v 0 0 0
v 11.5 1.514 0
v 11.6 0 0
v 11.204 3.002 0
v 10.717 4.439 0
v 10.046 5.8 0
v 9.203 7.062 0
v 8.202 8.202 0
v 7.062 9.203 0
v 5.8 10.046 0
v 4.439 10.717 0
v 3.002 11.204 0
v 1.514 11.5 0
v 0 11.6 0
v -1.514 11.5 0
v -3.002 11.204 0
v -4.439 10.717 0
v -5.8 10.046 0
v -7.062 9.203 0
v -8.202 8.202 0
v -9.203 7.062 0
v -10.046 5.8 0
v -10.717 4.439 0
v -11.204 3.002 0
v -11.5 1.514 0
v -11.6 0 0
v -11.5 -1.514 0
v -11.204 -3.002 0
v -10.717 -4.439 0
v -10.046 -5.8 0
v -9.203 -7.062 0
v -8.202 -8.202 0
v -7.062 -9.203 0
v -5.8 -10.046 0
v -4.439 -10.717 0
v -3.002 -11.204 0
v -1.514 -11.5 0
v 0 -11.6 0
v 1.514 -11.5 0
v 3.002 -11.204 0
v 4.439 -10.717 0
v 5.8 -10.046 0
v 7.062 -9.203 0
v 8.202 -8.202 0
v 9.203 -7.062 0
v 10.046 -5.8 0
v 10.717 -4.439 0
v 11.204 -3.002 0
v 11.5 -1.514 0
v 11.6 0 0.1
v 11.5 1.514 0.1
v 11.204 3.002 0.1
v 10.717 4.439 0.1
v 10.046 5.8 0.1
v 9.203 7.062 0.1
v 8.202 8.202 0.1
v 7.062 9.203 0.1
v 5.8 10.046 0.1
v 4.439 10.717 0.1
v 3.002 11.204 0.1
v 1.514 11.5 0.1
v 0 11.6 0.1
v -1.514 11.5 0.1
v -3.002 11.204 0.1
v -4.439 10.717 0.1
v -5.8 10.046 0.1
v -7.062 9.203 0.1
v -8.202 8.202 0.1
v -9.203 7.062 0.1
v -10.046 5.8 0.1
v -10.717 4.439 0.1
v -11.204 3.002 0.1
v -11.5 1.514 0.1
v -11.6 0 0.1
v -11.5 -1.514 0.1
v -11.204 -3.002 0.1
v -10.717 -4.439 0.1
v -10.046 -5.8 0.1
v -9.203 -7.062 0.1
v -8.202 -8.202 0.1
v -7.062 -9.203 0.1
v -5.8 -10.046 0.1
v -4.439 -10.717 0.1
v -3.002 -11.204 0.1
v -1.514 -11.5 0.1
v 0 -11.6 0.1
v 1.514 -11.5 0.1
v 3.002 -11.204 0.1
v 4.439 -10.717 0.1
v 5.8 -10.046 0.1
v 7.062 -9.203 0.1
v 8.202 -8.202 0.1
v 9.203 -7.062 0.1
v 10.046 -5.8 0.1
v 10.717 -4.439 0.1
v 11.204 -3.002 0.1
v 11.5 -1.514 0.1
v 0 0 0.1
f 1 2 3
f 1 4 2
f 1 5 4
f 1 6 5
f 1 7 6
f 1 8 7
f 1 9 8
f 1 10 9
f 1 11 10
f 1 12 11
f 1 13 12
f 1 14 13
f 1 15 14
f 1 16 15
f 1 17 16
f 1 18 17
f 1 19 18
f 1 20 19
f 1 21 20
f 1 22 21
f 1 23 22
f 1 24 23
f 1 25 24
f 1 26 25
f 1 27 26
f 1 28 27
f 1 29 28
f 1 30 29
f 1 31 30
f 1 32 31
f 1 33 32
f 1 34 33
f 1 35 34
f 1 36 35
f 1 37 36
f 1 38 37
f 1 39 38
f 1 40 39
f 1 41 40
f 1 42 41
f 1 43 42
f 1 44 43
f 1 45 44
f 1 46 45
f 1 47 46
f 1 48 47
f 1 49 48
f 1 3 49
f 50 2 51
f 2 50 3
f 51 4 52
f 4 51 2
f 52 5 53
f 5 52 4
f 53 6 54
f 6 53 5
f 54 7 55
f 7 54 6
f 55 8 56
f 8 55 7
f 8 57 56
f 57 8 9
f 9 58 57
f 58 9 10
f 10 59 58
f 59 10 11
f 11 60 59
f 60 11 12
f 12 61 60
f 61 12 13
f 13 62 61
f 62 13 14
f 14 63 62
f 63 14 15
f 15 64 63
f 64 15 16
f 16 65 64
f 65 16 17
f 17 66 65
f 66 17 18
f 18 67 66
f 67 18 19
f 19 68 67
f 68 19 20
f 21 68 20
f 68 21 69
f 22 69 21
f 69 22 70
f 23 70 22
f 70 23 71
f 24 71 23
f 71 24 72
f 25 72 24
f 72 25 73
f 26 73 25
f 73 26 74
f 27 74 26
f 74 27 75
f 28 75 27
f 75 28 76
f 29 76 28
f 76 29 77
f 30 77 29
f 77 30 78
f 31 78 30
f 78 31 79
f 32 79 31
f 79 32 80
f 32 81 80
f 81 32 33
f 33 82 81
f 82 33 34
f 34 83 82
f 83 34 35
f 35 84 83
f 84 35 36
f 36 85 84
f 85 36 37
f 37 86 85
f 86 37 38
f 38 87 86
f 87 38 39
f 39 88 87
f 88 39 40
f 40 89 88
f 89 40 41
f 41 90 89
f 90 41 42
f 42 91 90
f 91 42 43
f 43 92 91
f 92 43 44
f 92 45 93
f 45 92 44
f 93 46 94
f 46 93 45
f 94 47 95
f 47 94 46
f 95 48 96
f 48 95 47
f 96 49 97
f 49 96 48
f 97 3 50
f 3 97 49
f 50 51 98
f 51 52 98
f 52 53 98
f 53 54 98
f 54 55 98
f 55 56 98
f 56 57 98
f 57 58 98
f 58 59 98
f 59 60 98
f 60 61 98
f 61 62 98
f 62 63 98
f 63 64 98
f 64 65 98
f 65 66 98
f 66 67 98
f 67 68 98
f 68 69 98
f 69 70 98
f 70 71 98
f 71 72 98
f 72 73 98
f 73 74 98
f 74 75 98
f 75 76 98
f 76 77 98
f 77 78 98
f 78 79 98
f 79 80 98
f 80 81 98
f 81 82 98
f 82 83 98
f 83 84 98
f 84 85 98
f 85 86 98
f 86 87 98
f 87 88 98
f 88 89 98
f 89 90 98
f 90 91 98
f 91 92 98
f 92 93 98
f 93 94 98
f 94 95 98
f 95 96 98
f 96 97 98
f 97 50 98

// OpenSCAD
// file: ../p/48/1-4cyli.scad
use <../../lib.scad>
function ldraw_lib__48__1_4cyli() = [
// 0 Hi-Res Cylinder 0.25
// 0 Name: 48\1-4cyli.dat
// 0 Author: Manfred Moolhuysen
// 0 !LDRAW_ORG 48_Primitive UPDATE 2009-01
// 0 !LICENSE Licensed under CC BY 2.0 and CC BY 4.0 : see CAreadme.txt
// 
// 0 BFC CERTIFY CCW
  [0,"BFC","CERTIFY"],
  [0,"BFC","CCW"],
// 
// 0 !HISTORY 1999-07-05 [PTadmin] Official Update 1999-05
// 0 !HISTORY 2002-02-28 [hafhead] Added BFC statement
// 0 !HISTORY 2002-04-25 [PTadmin] Official Update 2002-02
// 0 !HISTORY 2007-06-24 [PTadmin] Header formatted for Contributor Agreement
// 0 !HISTORY 2008-07-01 [PTadmin] Official Update 2008-01
// 0 !HISTORY 2008-07-07 [guyvivan] Made BFC'ed CCW (2005-12-06)
// 0 !HISTORY 2009-05-02 [PTadmin] Official Update 2009-01
// 
// 
// 4 16 0.9914 0 0.1305 1 0 0 1 1 0 0.9914 1 0.1305
  [4,16,0.9914,0,0.1305,1,0,0,1,1,0,0.9914,1,0.1305],
// 4 16 0.9659 0 0.2588 0.9914 0 0.1305 0.9914 1 0.1305 0.9659 1 0.2588
  [4,16,0.9659,0,0.2588,0.9914,0,0.1305,0.9914,1,0.1305,0.9659,1,0.2588],
// 4 16 0.9239 0 0.3827 0.9659 0 0.2588 0.9659 1 0.2588 0.9239 1 0.3827
  [4,16,0.9239,0,0.3827,0.9659,0,0.2588,0.9659,1,0.2588,0.9239,1,0.3827],
// 4 16 0.866 0 0.5 0.9239 0 0.3827 0.9239 1 0.3827 0.866 1 0.5
  [4,16,0.866,0,0.5,0.9239,0,0.3827,0.9239,1,0.3827,0.866,1,0.5],
// 4 16 0.7934 0 0.6088 0.866 0 0.5 0.866 1 0.5 0.7934 1 0.6088
  [4,16,0.7934,0,0.6088,0.866,0,0.5,0.866,1,0.5,0.7934,1,0.6088],
// 4 16 0.7071 0 0.7071 0.7934 0 0.6088 0.7934 1 0.6088 0.7071 1 0.7071
  [4,16,0.7071,0,0.7071,0.7934,0,0.6088,0.7934,1,0.6088,0.7071,1,0.7071],
// 4 16 0.6088 0 0.7934 0.7071 0 0.7071 0.7071 1 0.7071 0.6088 1 0.7934
  [4,16,0.6088,0,0.7934,0.7071,0,0.7071,0.7071,1,0.7071,0.6088,1,0.7934],
// 4 16 0.5 0 0.866 0.6088 0 0.7934 0.6088 1 0.7934 0.5 1 0.866
  [4,16,0.5,0,0.866,0.6088,0,0.7934,0.6088,1,0.7934,0.5,1,0.866],
// 4 16 0.3827 0 0.9239 0.5 0 0.866 0.5 1 0.866 0.3827 1 0.9239
  [4,16,0.3827,0,0.9239,0.5,0,0.866,0.5,1,0.866,0.3827,1,0.9239],
// 4 16 0.2588 0 0.9659 0.3827 0 0.9239 0.3827 1 0.9239 0.2588 1 0.9659
  [4,16,0.2588,0,0.9659,0.3827,0,0.9239,0.3827,1,0.9239,0.2588,1,0.9659],
// 4 16 0.1305 0 0.9914 0.2588 0 0.9659 0.2588 1 0.9659 0.1305 1 0.9914
  [4,16,0.1305,0,0.9914,0.2588,0,0.9659,0.2588,1,0.9659,0.1305,1,0.9914],
// 4 16 0 0 1 0.1305 0 0.9914 0.1305 1 0.9914 0 1 1
  [4,16,0,0,1,0.1305,0,0.9914,0.1305,1,0.9914,0,1,1],
// 
// 0 conditional lines
// 5 24 1 1 0 1 0 0 1 1 -1 0.9914 1 0.1305
  [5,24,1,1,0,1,0,0,1,1,-1,0.9914,1,0.1305],
// 5 24 0.9914 1 0.1305 0.9914 0 0.1305 1 1 0 0.9659 1 0.2588
  [5,24,0.9914,1,0.1305,0.9914,0,0.1305,1,1,0,0.9659,1,0.2588],
// 5 24 0.9659 1 0.2588 0.9659 0 0.2588 0.9914 1 0.1305 0.9239 1 0.3827
  [5,24,0.9659,1,0.2588,0.9659,0,0.2588,0.9914,1,0.1305,0.9239,1,0.3827],
// 5 24 0.9239 1 0.3827 0.9239 0 0.3827 0.9659 1 0.2588 0.866 1 0.5
  [5,24,0.9239,1,0.3827,0.9239,0,0.3827,0.9659,1,0.2588,0.866,1,0.5],
// 5 24 0.866 1 0.5 0.866 0 0.5 0.9239 1 0.3827 0.7934 1 0.6088
  [5,24,0.866,1,0.5,0.866,0,0.5,0.9239,1,0.3827,0.7934,1,0.6088],
// 5 24 0.7934 1 0.6088 0.7934 0 0.6088 0.866 1 0.5 0.7071 1 0.7071
  [5,24,0.7934,1,0.6088,0.7934,0,0.6088,0.866,1,0.5,0.7071,1,0.7071],
// 5 24 0.7071 1 0.7071 0.7071 0 0.7071 0.7934 1 0.6088 0.6088 1 0.7934
  [5,24,0.7071,1,0.7071,0.7071,0,0.7071,0.7934,1,0.6088,0.6088,1,0.7934],
// 5 24 0.6088 1 0.7934 0.6088 0 0.7934 0.7071 1 0.7071 0.5 1 0.866
  [5,24,0.6088,1,0.7934,0.6088,0,0.7934,0.7071,1,0.7071,0.5,1,0.866],
// 5 24 0.5 1 0.866 0.5 0 0.866 0.6088 1 0.7934 0.3827 1 0.9239
  [5,24,0.5,1,0.866,0.5,0,0.866,0.6088,1,0.7934,0.3827,1,0.9239],
// 5 24 0.3827 1 0.9239 0.3827 0 0.9239 0.5 1 0.866 0.2588 1 0.9659
  [5,24,0.3827,1,0.9239,0.3827,0,0.9239,0.5,1,0.866,0.2588,1,0.9659],
// 5 24 0.2588 1 0.9659 0.2588 0 0.9659 0.3827 1 0.9239 0.1305 1 0.9914
  [5,24,0.2588,1,0.9659,0.2588,0,0.9659,0.3827,1,0.9239,0.1305,1,0.9914],
// 5 24 0.1305 1 0.9914 0.1305 0 0.9914 0.2588 1 0.9659 0 1 1
  [5,24,0.1305,1,0.9914,0.1305,0,0.9914,0.2588,1,0.9659,0,1,1],
// 5 24 0 1 1 0 0 1 0.1305 1 0.9914 -1 1 1
  [5,24,0,1,1,0,0,1,0.1305,1,0.9914,-1,1,1],
// 
// 0 end of file
];
module ldraw_lib__48__1_4cyli(step=0, col=false, unit=2/5, alt=false, line=0.2, solid=!$preview)
    makepoly(ldraw_lib__48__1_4cyli(), step=step, col=col, unit=unit, alt=alt, line=line, solid=solid);
ldraw_lib__48__1_4cyli(line=0.2);
// file: ../p/48/4-4cyli.scad
use <../../lib.scad>
use <1-4cyli.scad>
function ldraw_lib__48__4_4cyli() = [
// 0 Hi-Res Cylinder 1.0
// 0 Name: 48\4-4cyli.dat
// 0 Author: Paul Easter [pneaster]
// 0 !LDRAW_ORG 48_Primitive UPDATE 2012-02
// 0 !LICENSE Licensed under CC BY 4.0 : see CAreadme.txt
// 
// 0 BFC CERTIFY CCW
  [0,"BFC","CERTIFY"],
  [0,"BFC","CCW"],
// 
// 0 !HISTORY 2002-08-18 [PTadmin] Official Update 2002-04
// 0 !HISTORY 2007-06-24 [PTadmin] Header formatted for Contributor Agreement
// 0 !HISTORY 2008-07-01 [PTadmin] Official Update 2008-01
// 0 !HISTORY 2012-02-27 [Philo] Changed to CCW
// 0 !HISTORY 2012-08-09 [PTadmin] Official Update 2012-02
// 
// 
// 1 16 0 0 0 1 0 0 0 1 0 0 0 1 48\1-4cyli.dat
  [1,16,0,0,0,1,0,0,0,1,0,0,0,1, ldraw_lib__48__1_4cyli()],
// 1 16 0 0 0 0 0 -1 0 1 0 1 0 0 48\1-4cyli.dat
  [1,16,0,0,0,0,0,-1,0,1,0,1,0,0, ldraw_lib__48__1_4cyli()],
// 1 16 0 0 0 -1 0 0 0 1 0 0 0 -1 48\1-4cyli.dat
  [1,16,0,0,0,-1,0,0,0,1,0,0,0,-1, ldraw_lib__48__1_4cyli()],
// 1 16 0 0 0 0 0 1 0 1 0 -1 0 0 48\1-4cyli.dat
  [1,16,0,0,0,0,0,1,0,1,0,-1,0,0, ldraw_lib__48__1_4cyli()],
];
module ldraw_lib__48__4_4cyli(step=0, col=false, unit=2/5, alt=false, line=0.2, solid=!$preview)
    makepoly(ldraw_lib__48__4_4cyli(), step=step, col=col, unit=unit, alt=alt, line=line, solid=solid);
ldraw_lib__48__4_4cyli(line=0.2);
// file: ../p/48/4-4disc.scad
use <../../lib.scad>
function ldraw_lib__48__4_4disc() = [
// 0 Hi-Res Disc 1.0
// 0 Name: 48\4-4disc.dat
// 0 Author: Miklos Hosszu [hmick]
// 0 !LDRAW_ORG 48_Primitive UPDATE 2012-02
// 0 !LICENSE Licensed under CC BY 2.0 and CC BY 4.0 : see CAreadme.txt
// 
// 0 BFC CERTIFY CCW
  [0,"BFC","CERTIFY"],
  [0,"BFC","CCW"],
// 
// 0 !HISTORY 2004-11-06 [PTadmin] Official Update 2004-04
// 0 !HISTORY 2007-06-24 [PTadmin] Header formatted for Contributor Agreement
// 0 !HISTORY 2008-07-01 [PTadmin] Official Update 2008-01
// 0 !HISTORY 2012-02-27 [Philo] Changed to CCW
// 0 !HISTORY 2012-08-09 [PTadmin] Official Update 2012-02
// 
// 
// 3 16 1 0 0 0.9914 0 0.1305 0 0 0
  [3,16,1,0,0,0.9914,0,0.1305,0,0,0],
// 3 16 0.9914 0 0.1305 0.9659 0 0.2588 0 0 0
  [3,16,0.9914,0,0.1305,0.9659,0,0.2588,0,0,0],
// 3 16 0.9659 0 0.2588 0.9239 0 0.3827 0 0 0
  [3,16,0.9659,0,0.2588,0.9239,0,0.3827,0,0,0],
// 3 16 0.9239 0 0.3827 0.866 0 0.5 0 0 0
  [3,16,0.9239,0,0.3827,0.866,0,0.5,0,0,0],
// 3 16 0.866 0 0.5 0.7934 0 0.6088 0 0 0
  [3,16,0.866,0,0.5,0.7934,0,0.6088,0,0,0],
// 3 16 0.7934 0 0.6088 0.7071 0 0.7071 0 0 0
  [3,16,0.7934,0,0.6088,0.7071,0,0.7071,0,0,0],
// 3 16 0.7071 0 0.7071 0.6088 0 0.7934 0 0 0
  [3,16,0.7071,0,0.7071,0.6088,0,0.7934,0,0,0],
// 3 16 0.6088 0 0.7934 0.5 0 0.866 0 0 0
  [3,16,0.6088,0,0.7934,0.5,0,0.866,0,0,0],
// 3 16 0.5 0 0.866 0.3827 0 0.9239 0 0 0
  [3,16,0.5,0,0.866,0.3827,0,0.9239,0,0,0],
// 3 16 0.3827 0 0.9239 0.2588 0 0.9659 0 0 0
  [3,16,0.3827,0,0.9239,0.2588,0,0.9659,0,0,0],
// 3 16 0.2588 0 0.9659 0.1305 0 0.9914 0 0 0
  [3,16,0.2588,0,0.9659,0.1305,0,0.9914,0,0,0],
// 3 16 0.1305 0 0.9914 0 0 1 0 0 0
  [3,16,0.1305,0,0.9914,0,0,1,0,0,0],
// 3 16 0 0 1 -0.1305 0 0.9914 0 0 0
  [3,16,0,0,1,-0.1305,0,0.9914,0,0,0],
// 3 16 -0.1305 0 0.9914 -0.2588 0 0.9659 0 0 0
  [3,16,-0.1305,0,0.9914,-0.2588,0,0.9659,0,0,0],
// 3 16 -0.2588 0 0.9659 -0.3827 0 0.9239 0 0 0
  [3,16,-0.2588,0,0.9659,-0.3827,0,0.9239,0,0,0],
// 3 16 -0.3827 0 0.9239 -0.5 0 0.866 0 0 0
  [3,16,-0.3827,0,0.9239,-0.5,0,0.866,0,0,0],
// 3 16 -0.5 0 0.866 -0.6088 0 0.7934 0 0 0
  [3,16,-0.5,0,0.866,-0.6088,0,0.7934,0,0,0],
// 3 16 -0.6088 0 0.7934 -0.7071 0 0.7071 0 0 0
  [3,16,-0.6088,0,0.7934,-0.7071,0,0.7071,0,0,0],
// 3 16 -0.7071 0 0.7071 -0.7934 0 0.6088 0 0 0
  [3,16,-0.7071,0,0.7071,-0.7934,0,0.6088,0,0,0],
// 3 16 -0.7934 0 0.6088 -0.866 0 0.5 0 0 0
  [3,16,-0.7934,0,0.6088,-0.866,0,0.5,0,0,0],
// 3 16 -0.866 0 0.5 -0.9239 0 0.3827 0 0 0
  [3,16,-0.866,0,0.5,-0.9239,0,0.3827,0,0,0],
// 3 16 -0.9239 0 0.3827 -0.9659 0 0.2588 0 0 0
  [3,16,-0.9239,0,0.3827,-0.9659,0,0.2588,0,0,0],
// 3 16 -0.9659 0 0.2588 -0.9914 0 0.1305 0 0 0
  [3,16,-0.9659,0,0.2588,-0.9914,0,0.1305,0,0,0],
// 3 16 -0.9914 0 0.1305 -1 0 0 0 0 0
  [3,16,-0.9914,0,0.1305,-1,0,0,0,0,0],
// 3 16 -1 0 0 -0.9914 0 -0.1305 0 0 0
  [3,16,-1,0,0,-0.9914,0,-0.1305,0,0,0],
// 3 16 -0.9914 0 -0.1305 -0.9659 0 -0.2588 0 0 0
  [3,16,-0.9914,0,-0.1305,-0.9659,0,-0.2588,0,0,0],
// 3 16 -0.9659 0 -0.2588 -0.9239 0 -0.3827 0 0 0
  [3,16,-0.9659,0,-0.2588,-0.9239,0,-0.3827,0,0,0],
// 3 16 -0.9239 0 -0.3827 -0.866 0 -0.5 0 0 0
  [3,16,-0.9239,0,-0.3827,-0.866,0,-0.5,0,0,0],
// 3 16 -0.866 0 -0.5 -0.7934 0 -0.6088 0 0 0
  [3,16,-0.866,0,-0.5,-0.7934,0,-0.6088,0,0,0],
// 3 16 -0.7934 0 -0.6088 -0.7071 0 -0.7071 0 0 0
  [3,16,-0.7934,0,-0.6088,-0.7071,0,-0.7071,0,0,0],
// 3 16 -0.7071 0 -0.7071 -0.6088 0 -0.7934 0 0 0
  [3,16,-0.7071,0,-0.7071,-0.6088,0,-0.7934,0,0,0],
// 3 16 -0.6088 0 -0.7934 -0.5 0 -0.866 0 0 0
  [3,16,-0.6088,0,-0.7934,-0.5,0,-0.866,0,0,0],
// 3 16 -0.5 0 -0.866 -0.3827 0 -0.9239 0 0 0
  [3,16,-0.5,0,-0.866,-0.3827,0,-0.9239,0,0,0],
// 3 16 -0.3827 0 -0.9239 -0.2588 0 -0.9659 0 0 0
  [3,16,-0.3827,0,-0.9239,-0.2588,0,-0.9659,0,0,0],
// 3 16 -0.2588 0 -0.9659 -0.1305 0 -0.9914 0 0 0
  [3,16,-0.2588,0,-0.9659,-0.1305,0,-0.9914,0,0,0],
// 3 16 -0.1305 0 -0.9914 0 0 -1 0 0 0
  [3,16,-0.1305,0,-0.9914,0,0,-1,0,0,0],
// 3 16 0 0 -1 0.1305 0 -0.9914 0 0 0
  [3,16,0,0,-1,0.1305,0,-0.9914,0,0,0],
// 3 16 0.1305 0 -0.9914 0.2588 0 -0.9659 0 0 0
  [3,16,0.1305,0,-0.9914,0.2588,0,-0.9659,0,0,0],
// 3 16 0.2588 0 -0.9659 0.3827 0 -0.9239 0 0 0
  [3,16,0.2588,0,-0.9659,0.3827,0,-0.9239,0,0,0],
// 3 16 0.3827 0 -0.9239 0.5 0 -0.866 0 0 0
  [3,16,0.3827,0,-0.9239,0.5,0,-0.866,0,0,0],
// 3 16 0.5 0 -0.866 0.6088 0 -0.7934 0 0 0
  [3,16,0.5,0,-0.866,0.6088,0,-0.7934,0,0,0],
// 3 16 0.6088 0 -0.7934 0.7071 0 -0.7071 0 0 0
  [3,16,0.6088,0,-0.7934,0.7071,0,-0.7071,0,0,0],
// 3 16 0.7071 0 -0.7071 0.7934 0 -0.6088 0 0 0
  [3,16,0.7071,0,-0.7071,0.7934,0,-0.6088,0,0,0],
// 3 16 0.7934 0 -0.6088 0.866 0 -0.5 0 0 0
  [3,16,0.7934,0,-0.6088,0.866,0,-0.5,0,0,0],
// 3 16 0.866 0 -0.5 0.9239 0 -0.3827 0 0 0
  [3,16,0.866,0,-0.5,0.9239,0,-0.3827,0,0,0],
// 3 16 0.9239 0 -0.3827 0.9659 0 -0.2588 0 0 0
  [3,16,0.9239,0,-0.3827,0.9659,0,-0.2588,0,0,0],
// 3 16 0.9659 0 -0.2588 0.9914 0 -0.1305 0 0 0
  [3,16,0.9659,0,-0.2588,0.9914,0,-0.1305,0,0,0],
// 3 16 0.9914 0 -0.1305 1 0 0 0 0 0
  [3,16,0.9914,0,-0.1305,1,0,0,0,0,0],
];
module ldraw_lib__48__4_4disc(step=0, col=false, unit=2/5, alt=false, line=0.2, solid=!$preview)
    makepoly(ldraw_lib__48__4_4disc(), step=step, col=col, unit=unit, alt=alt, line=line, solid=solid);
ldraw_lib__48__4_4disc(line=0.2);
// file: ../p/48/4-4cylc3.scad
use <../../lib.scad>
use <4-4cyli.scad>
use <4-4disc.scad>
function ldraw_lib__48__4_4cylc3() = [
// 0 Hi-Res Cylinder Closed 1.0 without Top or Bottom Edge Lines
// 0 Name: 48\4-4cylc3.dat
// 0 Author: Chris Dee [cwdee]
// 0 !LDRAW_ORG 48_Primitive UPDATE 2017-01
// 0 !LICENSE Licensed under CC BY 4.0 : see CAreadme.txt
// 
// 0 BFC CERTIFY CCW
  [0,"BFC","CERTIFY"],
  [0,"BFC","CCW"],
// 
// 0 !HISTORY 2017-12-30 [PTadmin] Official Update 2017-01
// 
// 
// 1 16 0 0 0 1 0 0 0 1 0 0 0 1 48\4-4disc.dat
  [1,16,0,0,0,1,0,0,0,1,0,0,0,1, ldraw_lib__48__4_4disc()],
// 1 16 0 0 0 1 0 0 0 1 0 0 0 1 48\4-4cyli.dat
  [1,16,0,0,0,1,0,0,0,1,0,0,0,1, ldraw_lib__48__4_4cyli()],
// 0
];
module ldraw_lib__48__4_4cylc3(step=0, col=false, unit=2/5, alt=false, line=0.2, solid=!$preview)
    makepoly(ldraw_lib__48__4_4cylc3(), step=step, col=col, unit=unit, alt=alt, line=line, solid=solid);
ldraw_lib__48__4_4cylc3(line=0.2);
// main file
use <../lib.scad>
use <../p/48/4-4cylc3.scad>
use <../p/48/4-4disc.scad>
function ldraw_lib__6037721a() = [
// 0 Sticker  2.9 x  2.9 Round with Chrome Silver Mirror
// 0 Name: 6037721a.dat
// 0 Author: Takeshi Takahashi [RainbowDolphin]
// 0 !LDRAW_ORG Part UPDATE 2023-06
// 0 !LICENSE Licensed under CC BY 4.0 : see CAreadme.txt
// 
// 0 BFC CERTIFY CCW
  [0,"BFC","CERTIFY"],
  [0,"BFC","CCW"],
// 
// 0 !KEYWORDS Andrea, Bed room, Set 41009
// 
// 0 !HISTORY 2023-11-19 [OrionP] Official Update 2023-06
// 
// 
// 1 16 0 0 0 29 0 0 0 -0.25 0 0 0 29 48\4-4cylc3.dat
  [1,16,0,0,0,29,0,0,0,-0.25,0,0,0,29, ldraw_lib__48__4_4cylc3()],
// 1 383 0 -.25 0 29 0 0 0 1 0 0 0 29 48\4-4disc.dat
  [1,383,0,-.25,0,29,0,0,0,1,0,0,0,29, ldraw_lib__48__4_4disc()],
];
module ldraw_lib__6037721a(step=0, col=false, unit=2/5, alt=false, line=0.2, solid=!$preview)
    makepoly(ldraw_lib__6037721a(), step=step, col=col, unit=unit, alt=alt, line=line, solid=solid);
ldraw_lib__6037721a(line=0.2);
